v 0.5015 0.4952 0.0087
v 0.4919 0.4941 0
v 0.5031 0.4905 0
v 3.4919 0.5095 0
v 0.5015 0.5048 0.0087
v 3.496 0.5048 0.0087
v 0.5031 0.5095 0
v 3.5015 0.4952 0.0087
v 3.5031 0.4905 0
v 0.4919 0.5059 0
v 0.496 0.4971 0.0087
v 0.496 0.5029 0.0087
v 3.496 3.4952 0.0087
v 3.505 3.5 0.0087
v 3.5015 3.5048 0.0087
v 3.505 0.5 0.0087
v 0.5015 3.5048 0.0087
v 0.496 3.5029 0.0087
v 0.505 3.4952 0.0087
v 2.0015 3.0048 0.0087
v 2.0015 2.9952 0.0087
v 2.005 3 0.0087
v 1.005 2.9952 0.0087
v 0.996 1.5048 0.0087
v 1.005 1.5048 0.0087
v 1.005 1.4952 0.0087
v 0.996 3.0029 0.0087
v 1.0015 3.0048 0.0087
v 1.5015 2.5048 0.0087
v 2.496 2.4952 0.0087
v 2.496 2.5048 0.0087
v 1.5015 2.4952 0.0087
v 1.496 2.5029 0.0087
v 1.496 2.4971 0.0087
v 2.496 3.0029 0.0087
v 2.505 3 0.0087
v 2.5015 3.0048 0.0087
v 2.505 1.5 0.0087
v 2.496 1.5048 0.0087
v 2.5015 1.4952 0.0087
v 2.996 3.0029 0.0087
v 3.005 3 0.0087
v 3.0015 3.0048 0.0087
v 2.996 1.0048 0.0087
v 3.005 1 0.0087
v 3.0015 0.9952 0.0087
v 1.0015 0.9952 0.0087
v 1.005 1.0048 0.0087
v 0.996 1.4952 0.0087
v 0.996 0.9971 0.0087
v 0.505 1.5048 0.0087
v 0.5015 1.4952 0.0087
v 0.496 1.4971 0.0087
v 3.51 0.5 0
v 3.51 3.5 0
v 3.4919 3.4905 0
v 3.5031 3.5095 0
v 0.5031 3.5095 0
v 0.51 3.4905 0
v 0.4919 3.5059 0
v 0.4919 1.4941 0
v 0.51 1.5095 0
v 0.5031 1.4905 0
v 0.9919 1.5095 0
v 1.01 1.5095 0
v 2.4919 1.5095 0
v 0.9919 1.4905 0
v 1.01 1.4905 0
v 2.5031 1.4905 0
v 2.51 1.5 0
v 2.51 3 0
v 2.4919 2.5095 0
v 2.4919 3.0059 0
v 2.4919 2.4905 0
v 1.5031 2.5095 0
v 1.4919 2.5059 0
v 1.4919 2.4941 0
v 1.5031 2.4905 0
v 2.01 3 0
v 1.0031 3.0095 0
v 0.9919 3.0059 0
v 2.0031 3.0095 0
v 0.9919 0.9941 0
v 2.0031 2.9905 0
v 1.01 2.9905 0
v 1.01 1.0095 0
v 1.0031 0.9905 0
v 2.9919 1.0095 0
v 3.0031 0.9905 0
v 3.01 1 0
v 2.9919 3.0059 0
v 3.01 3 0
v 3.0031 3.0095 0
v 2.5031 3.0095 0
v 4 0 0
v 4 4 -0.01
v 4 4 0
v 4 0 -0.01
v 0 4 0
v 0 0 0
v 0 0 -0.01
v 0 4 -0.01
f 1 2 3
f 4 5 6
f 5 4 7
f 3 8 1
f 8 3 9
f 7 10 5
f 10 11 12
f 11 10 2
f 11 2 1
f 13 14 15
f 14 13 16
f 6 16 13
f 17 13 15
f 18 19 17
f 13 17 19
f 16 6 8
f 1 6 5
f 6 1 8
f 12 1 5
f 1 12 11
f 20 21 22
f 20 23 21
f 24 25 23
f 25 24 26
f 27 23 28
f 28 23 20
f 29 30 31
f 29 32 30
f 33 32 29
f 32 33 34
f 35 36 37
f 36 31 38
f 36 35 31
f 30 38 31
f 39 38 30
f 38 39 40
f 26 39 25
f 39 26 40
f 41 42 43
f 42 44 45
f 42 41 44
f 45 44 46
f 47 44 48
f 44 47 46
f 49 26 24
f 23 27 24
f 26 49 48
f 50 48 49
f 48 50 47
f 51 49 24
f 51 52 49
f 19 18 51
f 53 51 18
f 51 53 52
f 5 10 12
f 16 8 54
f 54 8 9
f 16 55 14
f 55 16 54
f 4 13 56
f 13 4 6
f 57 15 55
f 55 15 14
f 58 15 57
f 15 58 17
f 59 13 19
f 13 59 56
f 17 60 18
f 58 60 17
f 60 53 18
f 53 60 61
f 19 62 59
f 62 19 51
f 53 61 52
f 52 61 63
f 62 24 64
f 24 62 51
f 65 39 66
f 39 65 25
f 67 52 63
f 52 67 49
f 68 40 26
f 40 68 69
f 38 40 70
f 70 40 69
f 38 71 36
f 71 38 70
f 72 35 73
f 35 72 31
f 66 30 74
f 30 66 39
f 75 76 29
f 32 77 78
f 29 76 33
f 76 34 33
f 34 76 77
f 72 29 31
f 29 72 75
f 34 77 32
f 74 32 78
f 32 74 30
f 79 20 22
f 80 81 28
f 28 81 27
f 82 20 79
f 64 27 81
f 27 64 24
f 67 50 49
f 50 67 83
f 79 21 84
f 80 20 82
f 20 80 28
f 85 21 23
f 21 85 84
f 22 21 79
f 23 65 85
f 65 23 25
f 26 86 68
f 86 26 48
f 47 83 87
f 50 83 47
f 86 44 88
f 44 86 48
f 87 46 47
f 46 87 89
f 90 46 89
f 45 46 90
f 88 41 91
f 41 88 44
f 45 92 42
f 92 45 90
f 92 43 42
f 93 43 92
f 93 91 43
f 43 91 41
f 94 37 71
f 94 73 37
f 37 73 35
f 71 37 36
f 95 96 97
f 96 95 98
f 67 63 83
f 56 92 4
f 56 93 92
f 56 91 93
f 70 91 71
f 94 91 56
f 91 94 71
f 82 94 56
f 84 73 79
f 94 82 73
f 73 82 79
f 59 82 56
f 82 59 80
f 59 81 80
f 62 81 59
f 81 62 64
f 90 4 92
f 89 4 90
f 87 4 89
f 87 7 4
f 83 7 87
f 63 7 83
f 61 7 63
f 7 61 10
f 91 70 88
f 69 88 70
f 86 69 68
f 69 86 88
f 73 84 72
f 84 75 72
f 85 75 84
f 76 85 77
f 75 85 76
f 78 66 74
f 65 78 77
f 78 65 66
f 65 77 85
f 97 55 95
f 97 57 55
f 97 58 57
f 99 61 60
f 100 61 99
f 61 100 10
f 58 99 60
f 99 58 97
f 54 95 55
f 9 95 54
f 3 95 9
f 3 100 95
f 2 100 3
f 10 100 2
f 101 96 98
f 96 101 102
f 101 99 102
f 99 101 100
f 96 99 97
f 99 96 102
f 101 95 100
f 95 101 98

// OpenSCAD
hull(){
    translate([0.5, 0.5]) sphere(0.01);
    translate([1.5, 0.5]) sphere(0.01);
}
hull(){
    translate([1.5, 0.5]) sphere(0.01);
    translate([2.5, 0.5]) sphere(0.01);
}
hull(){
    translate([2.5, 0.5]) sphere(0.01);
    translate([3.5, 0.5]) sphere(0.01);
}
hull(){
    translate([3.5, 0.5]) sphere(0.01);
    translate([3.5, 1.5]) sphere(0.01);
}
hull(){
    translate([3.5, 1.5]) sphere(0.01);
    translate([3.5, 2.5]) sphere(0.01);
}
hull(){
    translate([3.5, 2.5]) sphere(0.01);
    translate([3.5, 3.5]) sphere(0.01);
}
hull(){
    translate([3.5, 3.5]) sphere(0.01);
    translate([2.5, 3.5]) sphere(0.01);
}
hull(){
    translate([2.5, 3.5]) sphere(0.01);
    translate([1.5, 3.5]) sphere(0.01);
}
hull(){
    translate([1.5, 3.5]) sphere(0.01);
    translate([0.5, 3.5]) sphere(0.01);
}
hull(){
    translate([0.5, 3.5]) sphere(0.01);
    translate([0.5, 2.5]) sphere(0.01);
}
hull(){
    translate([0.5, 2.5]) sphere(0.01);
    translate([0.5, 1.5]) sphere(0.01);
}
hull(){
    translate([0.5, 1.5]) sphere(0.01);
    translate([1.5, 1.5]) sphere(0.01);
}
hull(){
    translate([1.5, 1.5]) sphere(0.01);
    translate([2.5, 1.5]) sphere(0.01);
}
hull(){
    translate([2.5, 1.5]) sphere(0.01);
    translate([2.5, 2.5]) sphere(0.01);
}
hull(){
    translate([2.5, 2.5]) sphere(0.01);
    translate([1.5, 2.5]) sphere(0.01);
}
hull(){
    translate([2.0, 3.0]) sphere(0.01);
    translate([1.0, 3.0]) sphere(0.01);
}
hull(){
    translate([1.0, 3.0]) sphere(0.01);
    translate([1.0, 2.0]) sphere(0.01);
}
hull(){
    translate([1.0, 2.0]) sphere(0.01);
    translate([1.0, 1.0]) sphere(0.01);
}
hull(){
    translate([1.0, 1.0]) sphere(0.01);
    translate([2.0, 1.0]) sphere(0.01);
}
hull(){
    translate([2.0, 1.0]) sphere(0.01);
    translate([3.0, 1.0]) sphere(0.01);
}
hull(){
    translate([3.0, 1.0]) sphere(0.01);
    translate([3.0, 2.0]) sphere(0.01);
}
hull(){
    translate([3.0, 2.0]) sphere(0.01);
    translate([3.0, 3.0]) sphere(0.01);
}
hull(){
    translate([2.5, 3.0]) sphere(0.01);
    translate([2.5, 2.0]) sphere(0.01);
}
translate([0,0,-0.01]) color([0.1,0.1,0.1]) cube([4,4,0.01]);
